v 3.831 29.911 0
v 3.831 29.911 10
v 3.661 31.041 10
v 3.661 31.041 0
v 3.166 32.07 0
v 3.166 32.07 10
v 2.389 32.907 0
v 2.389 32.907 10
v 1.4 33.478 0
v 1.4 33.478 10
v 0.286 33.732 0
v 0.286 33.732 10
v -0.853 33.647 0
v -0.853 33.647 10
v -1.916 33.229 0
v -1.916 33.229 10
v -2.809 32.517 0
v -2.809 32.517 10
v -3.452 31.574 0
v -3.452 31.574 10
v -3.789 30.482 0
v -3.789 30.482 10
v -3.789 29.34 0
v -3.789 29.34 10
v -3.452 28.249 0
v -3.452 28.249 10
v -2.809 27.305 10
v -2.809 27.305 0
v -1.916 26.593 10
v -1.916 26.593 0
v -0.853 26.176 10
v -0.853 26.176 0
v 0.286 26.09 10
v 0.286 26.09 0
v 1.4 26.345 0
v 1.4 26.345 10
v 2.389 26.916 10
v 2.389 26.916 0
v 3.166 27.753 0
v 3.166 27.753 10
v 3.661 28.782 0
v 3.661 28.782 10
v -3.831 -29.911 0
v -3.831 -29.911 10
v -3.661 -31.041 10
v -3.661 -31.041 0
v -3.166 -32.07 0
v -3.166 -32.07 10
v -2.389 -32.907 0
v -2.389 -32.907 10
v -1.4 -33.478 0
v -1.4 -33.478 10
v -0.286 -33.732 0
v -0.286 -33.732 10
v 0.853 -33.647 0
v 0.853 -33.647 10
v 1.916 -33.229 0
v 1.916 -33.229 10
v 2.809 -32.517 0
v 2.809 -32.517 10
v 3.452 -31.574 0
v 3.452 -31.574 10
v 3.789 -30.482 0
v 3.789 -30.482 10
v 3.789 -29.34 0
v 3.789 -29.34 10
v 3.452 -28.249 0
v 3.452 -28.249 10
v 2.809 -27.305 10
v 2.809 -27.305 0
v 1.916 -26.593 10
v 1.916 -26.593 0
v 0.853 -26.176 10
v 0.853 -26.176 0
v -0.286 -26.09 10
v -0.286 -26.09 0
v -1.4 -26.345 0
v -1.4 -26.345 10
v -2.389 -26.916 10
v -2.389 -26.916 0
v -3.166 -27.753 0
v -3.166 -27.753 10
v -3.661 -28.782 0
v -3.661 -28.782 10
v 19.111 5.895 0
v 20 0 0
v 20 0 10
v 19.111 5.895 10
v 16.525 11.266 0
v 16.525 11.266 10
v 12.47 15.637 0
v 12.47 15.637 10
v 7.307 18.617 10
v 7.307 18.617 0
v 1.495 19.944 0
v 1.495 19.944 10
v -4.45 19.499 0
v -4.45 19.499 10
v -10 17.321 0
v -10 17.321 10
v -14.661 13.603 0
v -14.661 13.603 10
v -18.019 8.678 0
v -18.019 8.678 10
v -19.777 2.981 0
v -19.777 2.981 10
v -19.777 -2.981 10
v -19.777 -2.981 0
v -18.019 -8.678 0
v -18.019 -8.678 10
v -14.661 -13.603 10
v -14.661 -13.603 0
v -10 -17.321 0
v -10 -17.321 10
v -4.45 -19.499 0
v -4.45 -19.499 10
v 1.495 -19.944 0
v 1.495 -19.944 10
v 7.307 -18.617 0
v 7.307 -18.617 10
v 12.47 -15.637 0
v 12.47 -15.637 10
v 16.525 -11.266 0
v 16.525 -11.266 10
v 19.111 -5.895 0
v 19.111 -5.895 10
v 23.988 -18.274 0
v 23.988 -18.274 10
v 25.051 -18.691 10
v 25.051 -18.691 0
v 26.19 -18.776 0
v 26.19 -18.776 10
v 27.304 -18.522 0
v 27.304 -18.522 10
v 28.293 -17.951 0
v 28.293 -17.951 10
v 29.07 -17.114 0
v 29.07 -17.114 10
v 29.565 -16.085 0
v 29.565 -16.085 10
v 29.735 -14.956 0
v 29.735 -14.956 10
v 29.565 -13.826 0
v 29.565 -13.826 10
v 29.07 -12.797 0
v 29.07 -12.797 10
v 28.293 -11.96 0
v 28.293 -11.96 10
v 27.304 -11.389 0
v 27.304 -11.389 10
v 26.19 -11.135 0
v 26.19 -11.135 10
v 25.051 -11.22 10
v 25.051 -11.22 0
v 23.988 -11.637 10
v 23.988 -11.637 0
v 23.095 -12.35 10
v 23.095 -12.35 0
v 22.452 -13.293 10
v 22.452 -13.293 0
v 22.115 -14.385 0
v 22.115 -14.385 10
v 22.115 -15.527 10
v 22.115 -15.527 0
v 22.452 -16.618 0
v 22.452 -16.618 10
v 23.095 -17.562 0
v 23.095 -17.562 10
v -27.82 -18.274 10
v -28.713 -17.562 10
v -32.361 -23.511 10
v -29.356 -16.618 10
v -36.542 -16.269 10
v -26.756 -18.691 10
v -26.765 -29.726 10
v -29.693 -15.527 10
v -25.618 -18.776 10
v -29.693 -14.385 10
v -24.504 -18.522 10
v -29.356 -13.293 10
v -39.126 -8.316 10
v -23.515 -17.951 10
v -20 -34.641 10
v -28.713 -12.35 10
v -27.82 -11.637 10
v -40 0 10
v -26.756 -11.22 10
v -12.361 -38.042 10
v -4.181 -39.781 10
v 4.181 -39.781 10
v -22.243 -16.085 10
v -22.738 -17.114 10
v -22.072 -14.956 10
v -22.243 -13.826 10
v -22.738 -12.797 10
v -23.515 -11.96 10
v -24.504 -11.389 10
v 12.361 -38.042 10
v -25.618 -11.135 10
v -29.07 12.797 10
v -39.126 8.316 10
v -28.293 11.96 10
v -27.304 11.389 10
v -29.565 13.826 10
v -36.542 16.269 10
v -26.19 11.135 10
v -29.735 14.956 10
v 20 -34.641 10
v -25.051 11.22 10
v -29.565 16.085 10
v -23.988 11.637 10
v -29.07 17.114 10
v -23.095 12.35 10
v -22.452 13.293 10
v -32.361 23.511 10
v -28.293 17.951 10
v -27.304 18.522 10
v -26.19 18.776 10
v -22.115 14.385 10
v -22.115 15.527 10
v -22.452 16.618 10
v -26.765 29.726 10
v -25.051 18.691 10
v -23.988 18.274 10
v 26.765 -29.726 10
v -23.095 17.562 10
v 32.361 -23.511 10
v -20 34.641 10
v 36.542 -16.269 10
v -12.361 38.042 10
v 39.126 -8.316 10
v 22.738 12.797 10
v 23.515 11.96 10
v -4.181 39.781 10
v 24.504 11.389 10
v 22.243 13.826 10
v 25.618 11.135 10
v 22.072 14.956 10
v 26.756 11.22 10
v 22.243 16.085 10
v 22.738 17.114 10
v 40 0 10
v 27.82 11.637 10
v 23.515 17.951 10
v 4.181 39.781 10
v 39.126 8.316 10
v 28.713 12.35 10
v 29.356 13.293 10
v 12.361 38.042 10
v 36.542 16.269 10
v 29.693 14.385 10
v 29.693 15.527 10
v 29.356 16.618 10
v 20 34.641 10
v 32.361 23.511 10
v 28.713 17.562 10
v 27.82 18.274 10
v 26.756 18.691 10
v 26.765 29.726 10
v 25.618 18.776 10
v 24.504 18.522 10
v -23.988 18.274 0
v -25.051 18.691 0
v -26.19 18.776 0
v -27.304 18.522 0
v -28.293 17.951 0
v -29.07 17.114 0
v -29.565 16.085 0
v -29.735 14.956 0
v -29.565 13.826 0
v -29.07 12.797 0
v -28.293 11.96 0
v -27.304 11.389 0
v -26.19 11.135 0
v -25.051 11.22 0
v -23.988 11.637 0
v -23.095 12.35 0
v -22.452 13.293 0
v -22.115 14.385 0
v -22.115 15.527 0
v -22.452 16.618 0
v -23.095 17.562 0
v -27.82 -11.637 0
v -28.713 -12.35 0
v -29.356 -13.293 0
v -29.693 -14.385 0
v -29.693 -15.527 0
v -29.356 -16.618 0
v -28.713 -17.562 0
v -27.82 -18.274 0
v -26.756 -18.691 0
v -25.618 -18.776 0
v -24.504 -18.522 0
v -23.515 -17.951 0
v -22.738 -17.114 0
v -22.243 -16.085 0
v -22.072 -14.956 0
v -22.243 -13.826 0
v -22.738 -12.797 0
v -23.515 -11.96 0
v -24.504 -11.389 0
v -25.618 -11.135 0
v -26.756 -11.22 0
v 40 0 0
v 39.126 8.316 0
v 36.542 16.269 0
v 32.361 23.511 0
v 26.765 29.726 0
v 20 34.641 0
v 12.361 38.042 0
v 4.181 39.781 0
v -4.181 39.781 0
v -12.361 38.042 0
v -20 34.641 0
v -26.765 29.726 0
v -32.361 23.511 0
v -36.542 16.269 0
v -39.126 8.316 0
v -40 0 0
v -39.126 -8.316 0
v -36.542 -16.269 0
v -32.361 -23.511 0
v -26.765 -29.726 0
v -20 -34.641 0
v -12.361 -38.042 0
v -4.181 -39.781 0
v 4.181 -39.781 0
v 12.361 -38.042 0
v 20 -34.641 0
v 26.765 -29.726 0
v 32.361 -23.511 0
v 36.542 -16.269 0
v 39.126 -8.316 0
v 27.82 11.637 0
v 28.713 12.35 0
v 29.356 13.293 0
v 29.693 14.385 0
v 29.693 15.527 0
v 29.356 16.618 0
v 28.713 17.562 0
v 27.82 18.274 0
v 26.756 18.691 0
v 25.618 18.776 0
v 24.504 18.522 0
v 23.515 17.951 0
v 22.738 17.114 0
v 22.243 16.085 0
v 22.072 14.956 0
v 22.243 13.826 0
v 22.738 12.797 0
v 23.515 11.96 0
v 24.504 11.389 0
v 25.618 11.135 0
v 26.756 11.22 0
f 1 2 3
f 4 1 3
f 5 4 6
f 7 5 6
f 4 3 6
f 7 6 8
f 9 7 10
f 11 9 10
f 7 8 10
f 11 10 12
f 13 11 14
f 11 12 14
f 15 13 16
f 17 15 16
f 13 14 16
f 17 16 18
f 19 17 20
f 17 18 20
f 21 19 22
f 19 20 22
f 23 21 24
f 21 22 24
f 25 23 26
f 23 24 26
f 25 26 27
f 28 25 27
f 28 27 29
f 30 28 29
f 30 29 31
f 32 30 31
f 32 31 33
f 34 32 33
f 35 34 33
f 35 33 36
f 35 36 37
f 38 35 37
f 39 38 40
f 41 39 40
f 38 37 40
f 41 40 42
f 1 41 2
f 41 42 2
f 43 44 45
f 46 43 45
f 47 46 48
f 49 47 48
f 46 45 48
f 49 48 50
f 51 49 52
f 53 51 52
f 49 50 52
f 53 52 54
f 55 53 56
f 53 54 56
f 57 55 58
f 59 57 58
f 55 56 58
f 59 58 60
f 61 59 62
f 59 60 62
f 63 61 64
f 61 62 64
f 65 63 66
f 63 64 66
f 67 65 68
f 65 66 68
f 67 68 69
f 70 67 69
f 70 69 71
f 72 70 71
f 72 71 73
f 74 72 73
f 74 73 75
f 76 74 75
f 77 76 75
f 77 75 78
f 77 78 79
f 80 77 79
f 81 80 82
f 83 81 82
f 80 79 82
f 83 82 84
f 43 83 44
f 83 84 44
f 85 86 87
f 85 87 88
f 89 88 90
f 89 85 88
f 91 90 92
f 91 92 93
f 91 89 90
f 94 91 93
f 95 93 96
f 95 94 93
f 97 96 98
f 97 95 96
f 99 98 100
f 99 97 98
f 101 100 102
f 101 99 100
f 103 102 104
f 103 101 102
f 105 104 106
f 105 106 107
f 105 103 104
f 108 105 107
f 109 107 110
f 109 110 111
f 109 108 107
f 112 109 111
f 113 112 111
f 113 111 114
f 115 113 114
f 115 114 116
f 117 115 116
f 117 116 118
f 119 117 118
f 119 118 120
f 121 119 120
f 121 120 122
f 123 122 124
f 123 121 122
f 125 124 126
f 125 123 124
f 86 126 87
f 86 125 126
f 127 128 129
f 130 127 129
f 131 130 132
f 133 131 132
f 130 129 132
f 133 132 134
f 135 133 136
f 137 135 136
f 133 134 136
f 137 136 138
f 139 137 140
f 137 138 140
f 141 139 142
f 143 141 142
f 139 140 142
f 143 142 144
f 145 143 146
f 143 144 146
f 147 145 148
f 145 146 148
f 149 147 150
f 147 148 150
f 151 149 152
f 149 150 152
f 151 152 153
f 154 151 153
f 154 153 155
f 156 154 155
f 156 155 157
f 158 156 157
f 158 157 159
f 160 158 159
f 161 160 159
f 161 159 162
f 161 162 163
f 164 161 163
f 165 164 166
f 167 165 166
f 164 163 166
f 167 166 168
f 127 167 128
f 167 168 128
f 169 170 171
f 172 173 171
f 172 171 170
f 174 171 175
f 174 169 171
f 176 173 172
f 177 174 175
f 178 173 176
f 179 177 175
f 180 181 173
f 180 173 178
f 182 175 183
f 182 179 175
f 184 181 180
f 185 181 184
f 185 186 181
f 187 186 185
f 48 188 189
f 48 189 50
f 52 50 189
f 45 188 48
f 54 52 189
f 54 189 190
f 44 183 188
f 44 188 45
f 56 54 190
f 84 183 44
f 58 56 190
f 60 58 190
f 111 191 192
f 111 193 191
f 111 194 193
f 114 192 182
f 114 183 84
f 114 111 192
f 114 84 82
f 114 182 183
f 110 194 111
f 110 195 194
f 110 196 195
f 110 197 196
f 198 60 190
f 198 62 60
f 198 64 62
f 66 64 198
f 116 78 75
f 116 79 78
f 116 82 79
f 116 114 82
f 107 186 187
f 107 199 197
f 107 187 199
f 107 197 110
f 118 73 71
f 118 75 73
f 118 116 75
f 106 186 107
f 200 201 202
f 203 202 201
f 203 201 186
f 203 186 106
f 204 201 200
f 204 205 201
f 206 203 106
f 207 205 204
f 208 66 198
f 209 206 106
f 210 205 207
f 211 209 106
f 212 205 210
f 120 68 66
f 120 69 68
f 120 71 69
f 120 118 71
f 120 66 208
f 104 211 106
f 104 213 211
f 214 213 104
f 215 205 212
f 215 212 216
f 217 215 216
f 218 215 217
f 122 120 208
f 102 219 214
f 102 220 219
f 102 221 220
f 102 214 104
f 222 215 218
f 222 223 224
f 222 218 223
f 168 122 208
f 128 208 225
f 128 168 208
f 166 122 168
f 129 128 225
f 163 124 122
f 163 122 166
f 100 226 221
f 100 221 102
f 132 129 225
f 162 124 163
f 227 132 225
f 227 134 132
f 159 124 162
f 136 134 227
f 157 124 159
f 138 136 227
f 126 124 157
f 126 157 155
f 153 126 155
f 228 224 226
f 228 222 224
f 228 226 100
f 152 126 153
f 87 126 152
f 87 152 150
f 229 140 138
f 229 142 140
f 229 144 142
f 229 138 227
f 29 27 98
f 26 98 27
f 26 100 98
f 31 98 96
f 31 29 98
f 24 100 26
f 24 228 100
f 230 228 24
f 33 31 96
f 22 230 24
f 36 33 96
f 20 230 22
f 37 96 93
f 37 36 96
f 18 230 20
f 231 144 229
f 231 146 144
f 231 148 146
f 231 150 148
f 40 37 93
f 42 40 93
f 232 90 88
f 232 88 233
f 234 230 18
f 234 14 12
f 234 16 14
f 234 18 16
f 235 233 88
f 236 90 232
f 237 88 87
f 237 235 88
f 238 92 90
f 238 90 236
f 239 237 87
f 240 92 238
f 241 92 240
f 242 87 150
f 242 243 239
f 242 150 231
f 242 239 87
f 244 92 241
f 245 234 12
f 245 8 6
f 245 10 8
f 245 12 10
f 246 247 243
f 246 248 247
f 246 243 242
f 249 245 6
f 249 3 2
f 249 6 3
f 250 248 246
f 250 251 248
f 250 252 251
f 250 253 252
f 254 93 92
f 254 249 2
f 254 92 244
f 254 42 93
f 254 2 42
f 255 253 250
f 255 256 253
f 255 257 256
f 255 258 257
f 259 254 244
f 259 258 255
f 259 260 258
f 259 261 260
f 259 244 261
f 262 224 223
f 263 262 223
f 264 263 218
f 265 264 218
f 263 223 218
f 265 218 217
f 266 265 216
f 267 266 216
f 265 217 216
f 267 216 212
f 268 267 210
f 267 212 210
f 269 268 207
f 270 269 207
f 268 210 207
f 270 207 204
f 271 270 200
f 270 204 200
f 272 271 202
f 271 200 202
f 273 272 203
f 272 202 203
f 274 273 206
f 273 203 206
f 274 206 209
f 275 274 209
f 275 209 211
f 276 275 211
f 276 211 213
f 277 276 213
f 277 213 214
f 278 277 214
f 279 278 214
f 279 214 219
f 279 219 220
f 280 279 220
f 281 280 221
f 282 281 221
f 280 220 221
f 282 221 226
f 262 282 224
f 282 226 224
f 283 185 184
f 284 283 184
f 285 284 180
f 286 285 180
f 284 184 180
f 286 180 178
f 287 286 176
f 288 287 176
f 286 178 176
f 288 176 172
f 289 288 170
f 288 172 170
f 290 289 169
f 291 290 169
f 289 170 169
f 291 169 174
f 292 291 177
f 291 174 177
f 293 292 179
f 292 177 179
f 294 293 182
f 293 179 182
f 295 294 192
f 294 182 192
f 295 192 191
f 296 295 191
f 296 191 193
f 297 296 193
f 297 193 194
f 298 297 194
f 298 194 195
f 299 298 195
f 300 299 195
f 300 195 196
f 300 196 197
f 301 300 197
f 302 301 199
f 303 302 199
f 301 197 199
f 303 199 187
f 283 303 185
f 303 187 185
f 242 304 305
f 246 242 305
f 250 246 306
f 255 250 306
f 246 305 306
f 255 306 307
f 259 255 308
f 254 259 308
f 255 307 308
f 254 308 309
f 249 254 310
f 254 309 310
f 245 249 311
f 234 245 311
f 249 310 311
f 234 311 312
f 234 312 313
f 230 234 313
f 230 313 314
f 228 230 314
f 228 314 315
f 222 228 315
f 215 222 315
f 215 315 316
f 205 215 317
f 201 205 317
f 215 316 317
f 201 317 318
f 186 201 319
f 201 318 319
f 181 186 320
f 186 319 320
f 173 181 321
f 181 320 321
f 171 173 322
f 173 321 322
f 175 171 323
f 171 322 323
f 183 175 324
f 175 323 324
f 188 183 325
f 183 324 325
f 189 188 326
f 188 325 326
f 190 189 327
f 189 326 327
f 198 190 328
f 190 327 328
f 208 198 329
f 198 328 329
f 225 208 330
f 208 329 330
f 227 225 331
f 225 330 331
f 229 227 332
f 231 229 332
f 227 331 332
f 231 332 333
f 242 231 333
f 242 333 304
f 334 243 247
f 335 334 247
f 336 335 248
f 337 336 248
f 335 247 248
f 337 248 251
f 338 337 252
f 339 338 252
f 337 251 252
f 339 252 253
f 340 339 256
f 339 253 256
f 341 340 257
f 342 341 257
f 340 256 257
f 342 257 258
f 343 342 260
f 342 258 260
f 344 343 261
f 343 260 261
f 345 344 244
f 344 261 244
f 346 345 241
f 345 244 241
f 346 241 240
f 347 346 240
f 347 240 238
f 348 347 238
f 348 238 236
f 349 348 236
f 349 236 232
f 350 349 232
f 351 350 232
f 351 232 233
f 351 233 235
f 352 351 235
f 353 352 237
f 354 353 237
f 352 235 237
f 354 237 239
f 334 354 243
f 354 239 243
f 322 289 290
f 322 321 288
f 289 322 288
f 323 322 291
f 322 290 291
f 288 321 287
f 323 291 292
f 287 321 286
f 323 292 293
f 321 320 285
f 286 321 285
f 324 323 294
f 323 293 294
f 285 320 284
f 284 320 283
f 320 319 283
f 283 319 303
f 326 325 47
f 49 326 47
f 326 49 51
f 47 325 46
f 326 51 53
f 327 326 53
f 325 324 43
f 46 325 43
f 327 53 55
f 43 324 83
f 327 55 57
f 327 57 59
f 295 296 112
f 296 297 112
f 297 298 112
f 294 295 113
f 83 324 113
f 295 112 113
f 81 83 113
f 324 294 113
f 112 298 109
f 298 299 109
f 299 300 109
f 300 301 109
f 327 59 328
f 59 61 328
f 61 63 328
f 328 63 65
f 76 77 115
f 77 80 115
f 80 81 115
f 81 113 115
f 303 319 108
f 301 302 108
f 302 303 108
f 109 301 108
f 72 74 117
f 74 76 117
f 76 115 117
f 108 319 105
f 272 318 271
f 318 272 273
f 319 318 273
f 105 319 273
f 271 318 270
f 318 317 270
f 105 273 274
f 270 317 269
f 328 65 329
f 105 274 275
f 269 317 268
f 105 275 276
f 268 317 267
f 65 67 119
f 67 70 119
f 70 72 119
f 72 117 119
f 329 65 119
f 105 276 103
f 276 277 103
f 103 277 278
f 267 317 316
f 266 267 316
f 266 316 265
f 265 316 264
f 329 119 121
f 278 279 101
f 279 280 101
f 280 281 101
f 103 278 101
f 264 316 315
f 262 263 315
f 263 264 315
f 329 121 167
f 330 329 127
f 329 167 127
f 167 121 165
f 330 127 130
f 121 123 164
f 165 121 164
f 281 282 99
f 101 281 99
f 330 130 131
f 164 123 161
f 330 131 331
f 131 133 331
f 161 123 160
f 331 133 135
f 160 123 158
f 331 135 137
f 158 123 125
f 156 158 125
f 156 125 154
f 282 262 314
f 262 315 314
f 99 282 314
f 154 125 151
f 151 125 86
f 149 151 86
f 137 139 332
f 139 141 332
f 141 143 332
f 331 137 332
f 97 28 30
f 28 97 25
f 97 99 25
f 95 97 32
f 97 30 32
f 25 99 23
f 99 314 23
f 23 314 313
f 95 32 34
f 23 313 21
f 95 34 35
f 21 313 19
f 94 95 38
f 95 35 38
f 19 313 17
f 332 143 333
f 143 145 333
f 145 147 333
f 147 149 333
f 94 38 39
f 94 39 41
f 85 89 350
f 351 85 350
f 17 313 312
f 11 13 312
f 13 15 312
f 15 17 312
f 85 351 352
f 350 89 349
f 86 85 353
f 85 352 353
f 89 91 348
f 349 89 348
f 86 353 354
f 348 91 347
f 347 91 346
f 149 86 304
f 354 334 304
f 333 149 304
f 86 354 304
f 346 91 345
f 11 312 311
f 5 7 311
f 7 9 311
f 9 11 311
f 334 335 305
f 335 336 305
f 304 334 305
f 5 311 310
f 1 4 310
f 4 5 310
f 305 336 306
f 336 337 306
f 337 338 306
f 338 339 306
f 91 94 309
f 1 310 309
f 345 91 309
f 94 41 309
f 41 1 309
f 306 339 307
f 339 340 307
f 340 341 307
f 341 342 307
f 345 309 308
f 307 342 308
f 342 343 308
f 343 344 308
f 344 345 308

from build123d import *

# Parameters (mm, degrees)
SKETCH1_R           = 40
SKETCH1_R_2         = 20
BOSS_EXTRUDE1_DEPTH = 10
SKETCH2_R           = 3.831489411
CUT_EXTRUDE1_DEPTH  = 10
CIRPATTERN1_COUNT   = 6


with BuildPart() as part:
    # Sketch1 → Boss-Extrude1 (new body)
    with BuildSketch(Plane.XY):
        Circle(SKETCH1_R)
        Circle(SKETCH1_R_2, mode=Mode.SUBTRACT)
    extrude(amount=BOSS_EXTRUDE1_DEPTH)

    # Sketch2 → Cut-Extrude1 (cut)
    with BuildSketch(Plane.XY.offset(10)):
        with Locations((0, 29.911239538)):
            Circle(SKETCH2_R)
    cut_extrude1 = extrude(amount=-CUT_EXTRUDE1_DEPTH, mode=Mode.SUBTRACT)

    # CirPattern1: Cut-Extrude1 ×6 about axis
    cirpattern1_axis = Axis((0, 0, 0), (0, 0, 1))
    for i in range(1, CIRPATTERN1_COUNT):
        add(cut_extrude1.rotate(cirpattern1_axis, i * 360 / CIRPATTERN1_COUNT), mode=Mode.SUBTRACT)


solid = part.part
